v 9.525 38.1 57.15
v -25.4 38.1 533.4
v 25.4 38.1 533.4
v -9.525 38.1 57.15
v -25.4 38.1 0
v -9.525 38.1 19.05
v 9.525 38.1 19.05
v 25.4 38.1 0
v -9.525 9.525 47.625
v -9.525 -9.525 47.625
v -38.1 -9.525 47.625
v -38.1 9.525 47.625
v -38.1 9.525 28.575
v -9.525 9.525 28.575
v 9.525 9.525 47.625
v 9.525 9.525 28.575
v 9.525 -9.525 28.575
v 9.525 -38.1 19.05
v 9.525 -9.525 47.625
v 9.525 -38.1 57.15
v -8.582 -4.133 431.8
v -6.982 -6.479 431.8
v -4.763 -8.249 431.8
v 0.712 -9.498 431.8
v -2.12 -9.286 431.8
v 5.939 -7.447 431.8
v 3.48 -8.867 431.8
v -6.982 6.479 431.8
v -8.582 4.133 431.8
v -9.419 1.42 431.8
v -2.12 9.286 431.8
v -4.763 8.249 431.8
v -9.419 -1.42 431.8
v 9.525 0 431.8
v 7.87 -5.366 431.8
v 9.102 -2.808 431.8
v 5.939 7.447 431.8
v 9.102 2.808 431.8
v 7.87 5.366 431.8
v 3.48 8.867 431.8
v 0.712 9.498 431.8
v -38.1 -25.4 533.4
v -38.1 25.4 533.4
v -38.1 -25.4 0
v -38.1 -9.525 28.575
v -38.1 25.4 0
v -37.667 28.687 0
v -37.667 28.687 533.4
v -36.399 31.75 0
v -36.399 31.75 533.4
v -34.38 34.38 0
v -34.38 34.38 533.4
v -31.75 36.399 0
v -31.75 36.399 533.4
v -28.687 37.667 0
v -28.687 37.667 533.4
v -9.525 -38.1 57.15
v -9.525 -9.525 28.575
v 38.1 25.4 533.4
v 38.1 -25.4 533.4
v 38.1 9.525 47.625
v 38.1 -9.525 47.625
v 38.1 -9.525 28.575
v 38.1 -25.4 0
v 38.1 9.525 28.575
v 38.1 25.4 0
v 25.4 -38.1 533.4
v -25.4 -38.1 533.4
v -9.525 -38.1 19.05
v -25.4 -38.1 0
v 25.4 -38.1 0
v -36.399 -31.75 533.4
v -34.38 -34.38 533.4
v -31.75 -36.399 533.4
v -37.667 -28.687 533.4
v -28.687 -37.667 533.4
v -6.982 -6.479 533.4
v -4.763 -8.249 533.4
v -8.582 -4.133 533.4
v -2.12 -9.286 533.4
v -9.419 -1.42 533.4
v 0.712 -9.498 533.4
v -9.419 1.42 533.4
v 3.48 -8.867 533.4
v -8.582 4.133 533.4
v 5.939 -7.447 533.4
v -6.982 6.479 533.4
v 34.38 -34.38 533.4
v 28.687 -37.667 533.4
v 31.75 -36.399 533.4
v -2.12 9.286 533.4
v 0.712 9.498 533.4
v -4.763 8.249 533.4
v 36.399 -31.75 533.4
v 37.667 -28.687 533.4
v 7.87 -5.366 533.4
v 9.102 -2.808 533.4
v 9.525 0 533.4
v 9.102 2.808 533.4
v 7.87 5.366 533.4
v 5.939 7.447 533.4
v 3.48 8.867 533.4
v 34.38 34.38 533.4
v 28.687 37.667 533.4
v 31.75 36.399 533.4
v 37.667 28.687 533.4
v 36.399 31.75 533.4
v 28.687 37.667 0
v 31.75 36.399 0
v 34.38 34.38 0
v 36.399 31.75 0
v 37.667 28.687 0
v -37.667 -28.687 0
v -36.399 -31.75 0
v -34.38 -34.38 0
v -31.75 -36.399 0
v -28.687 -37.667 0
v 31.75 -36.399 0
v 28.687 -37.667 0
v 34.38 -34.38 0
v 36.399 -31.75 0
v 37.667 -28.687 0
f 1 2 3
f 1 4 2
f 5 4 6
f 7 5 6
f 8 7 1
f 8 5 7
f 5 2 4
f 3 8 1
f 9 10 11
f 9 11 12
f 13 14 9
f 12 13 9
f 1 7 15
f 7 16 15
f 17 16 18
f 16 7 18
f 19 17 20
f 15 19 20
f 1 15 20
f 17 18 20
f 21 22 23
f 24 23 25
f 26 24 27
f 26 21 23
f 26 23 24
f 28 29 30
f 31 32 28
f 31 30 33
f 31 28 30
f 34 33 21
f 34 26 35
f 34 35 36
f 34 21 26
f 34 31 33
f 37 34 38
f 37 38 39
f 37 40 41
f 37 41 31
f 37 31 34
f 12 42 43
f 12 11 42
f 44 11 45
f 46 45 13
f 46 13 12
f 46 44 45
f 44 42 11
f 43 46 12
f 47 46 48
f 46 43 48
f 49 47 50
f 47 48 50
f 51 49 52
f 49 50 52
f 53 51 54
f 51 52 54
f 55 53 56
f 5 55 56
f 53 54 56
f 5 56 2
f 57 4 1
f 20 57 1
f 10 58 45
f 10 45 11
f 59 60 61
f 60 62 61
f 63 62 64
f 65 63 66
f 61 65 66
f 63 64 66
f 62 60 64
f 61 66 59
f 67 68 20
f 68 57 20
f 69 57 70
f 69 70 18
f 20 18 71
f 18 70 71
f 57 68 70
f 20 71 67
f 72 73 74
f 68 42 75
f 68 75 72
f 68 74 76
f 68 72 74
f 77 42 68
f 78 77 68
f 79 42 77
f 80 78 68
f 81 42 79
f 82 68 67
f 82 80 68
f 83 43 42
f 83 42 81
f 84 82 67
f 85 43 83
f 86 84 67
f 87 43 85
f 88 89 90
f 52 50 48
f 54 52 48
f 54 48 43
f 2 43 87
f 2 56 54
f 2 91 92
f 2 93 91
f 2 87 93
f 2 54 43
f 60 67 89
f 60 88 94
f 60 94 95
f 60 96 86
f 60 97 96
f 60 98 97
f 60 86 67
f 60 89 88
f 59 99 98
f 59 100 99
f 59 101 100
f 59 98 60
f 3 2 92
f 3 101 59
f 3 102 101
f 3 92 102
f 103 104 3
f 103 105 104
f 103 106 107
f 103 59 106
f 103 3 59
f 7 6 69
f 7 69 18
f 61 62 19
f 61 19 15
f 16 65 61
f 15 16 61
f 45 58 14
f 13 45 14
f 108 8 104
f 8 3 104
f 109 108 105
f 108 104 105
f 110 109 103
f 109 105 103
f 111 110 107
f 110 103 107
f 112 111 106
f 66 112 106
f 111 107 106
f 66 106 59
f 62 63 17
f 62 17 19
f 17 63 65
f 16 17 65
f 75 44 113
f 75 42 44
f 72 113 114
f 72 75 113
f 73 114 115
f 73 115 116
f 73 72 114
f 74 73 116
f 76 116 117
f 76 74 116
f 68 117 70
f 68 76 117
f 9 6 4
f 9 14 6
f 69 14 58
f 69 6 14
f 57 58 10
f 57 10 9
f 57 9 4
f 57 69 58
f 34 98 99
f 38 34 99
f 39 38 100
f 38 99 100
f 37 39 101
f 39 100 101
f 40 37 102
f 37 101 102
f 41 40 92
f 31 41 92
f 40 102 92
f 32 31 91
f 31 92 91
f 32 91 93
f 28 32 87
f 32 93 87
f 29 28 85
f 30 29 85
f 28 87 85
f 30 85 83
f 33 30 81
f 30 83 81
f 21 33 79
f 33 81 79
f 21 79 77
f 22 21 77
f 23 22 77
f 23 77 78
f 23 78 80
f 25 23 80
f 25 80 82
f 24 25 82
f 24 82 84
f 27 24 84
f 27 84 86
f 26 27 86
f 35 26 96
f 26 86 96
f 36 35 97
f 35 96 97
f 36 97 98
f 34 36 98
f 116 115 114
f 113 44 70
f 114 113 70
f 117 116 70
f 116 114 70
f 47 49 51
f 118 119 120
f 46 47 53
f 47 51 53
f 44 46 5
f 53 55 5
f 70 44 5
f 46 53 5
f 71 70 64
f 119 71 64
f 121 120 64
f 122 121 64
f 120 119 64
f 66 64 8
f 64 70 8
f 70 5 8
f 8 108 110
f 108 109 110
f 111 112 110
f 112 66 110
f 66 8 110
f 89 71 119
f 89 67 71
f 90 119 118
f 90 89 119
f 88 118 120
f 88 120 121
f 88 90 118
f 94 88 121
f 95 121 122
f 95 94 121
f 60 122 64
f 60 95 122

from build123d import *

# Parameters (mm, degrees)
F0_W     = 76.2
F0_H     = 76.2
F1_DEPTH = 533.4
F2_R     = 9.525
F3_DEPTH = 101.6
F4_W     = 19.05
F4_H     = 38.1
F5_DEPTH = 76.2
F6_W     = 19.05
F6_H     = 19.05
F7_DEPTH = 76.201
F8_R     = 12.7


with BuildPart() as f1:
    # F0 (on Top) → F1 (new body)
    with BuildSketch(Plane.XY):
        Rectangle(F0_W, F0_H)
    extrude(amount=F1_DEPTH)

    # F2 (on face) → F3 (cut)
    with BuildSketch(Plane.XY.offset(533.4)):
        Circle(F2_R)
    extrude(amount=-F3_DEPTH, mode=Mode.SUBTRACT)

    # F4 (on face) → F5 (cut, through all)
    with BuildSketch(Plane.XZ.offset(38.1)):
        with Locations((0, 38.1)):
            Rectangle(F4_W, F4_H)
    extrude(amount=-F5_DEPTH, mode=Mode.SUBTRACT)

    # F6 (on face) → F7 (cut, through all)
    with BuildSketch(Plane.YZ.offset(38.1)):
        with Locations((0, 38.1)):
            Rectangle(F6_W, F6_H)
    extrude(amount=-F7_DEPTH, mode=Mode.SUBTRACT)

    # F8
    f8_edges = [f1.edges().sort_by_distance(p)[0] for p in [
        (-38.1, -38.1, 266.7),
        (38.1, -38.1, 266.7),
        (38.1, 38.1, 266.7),
        (-38.1, 38.1, 266.7),
    ]]
    fillet(f8_edges, radius=F8_R)


solid = f1.part
